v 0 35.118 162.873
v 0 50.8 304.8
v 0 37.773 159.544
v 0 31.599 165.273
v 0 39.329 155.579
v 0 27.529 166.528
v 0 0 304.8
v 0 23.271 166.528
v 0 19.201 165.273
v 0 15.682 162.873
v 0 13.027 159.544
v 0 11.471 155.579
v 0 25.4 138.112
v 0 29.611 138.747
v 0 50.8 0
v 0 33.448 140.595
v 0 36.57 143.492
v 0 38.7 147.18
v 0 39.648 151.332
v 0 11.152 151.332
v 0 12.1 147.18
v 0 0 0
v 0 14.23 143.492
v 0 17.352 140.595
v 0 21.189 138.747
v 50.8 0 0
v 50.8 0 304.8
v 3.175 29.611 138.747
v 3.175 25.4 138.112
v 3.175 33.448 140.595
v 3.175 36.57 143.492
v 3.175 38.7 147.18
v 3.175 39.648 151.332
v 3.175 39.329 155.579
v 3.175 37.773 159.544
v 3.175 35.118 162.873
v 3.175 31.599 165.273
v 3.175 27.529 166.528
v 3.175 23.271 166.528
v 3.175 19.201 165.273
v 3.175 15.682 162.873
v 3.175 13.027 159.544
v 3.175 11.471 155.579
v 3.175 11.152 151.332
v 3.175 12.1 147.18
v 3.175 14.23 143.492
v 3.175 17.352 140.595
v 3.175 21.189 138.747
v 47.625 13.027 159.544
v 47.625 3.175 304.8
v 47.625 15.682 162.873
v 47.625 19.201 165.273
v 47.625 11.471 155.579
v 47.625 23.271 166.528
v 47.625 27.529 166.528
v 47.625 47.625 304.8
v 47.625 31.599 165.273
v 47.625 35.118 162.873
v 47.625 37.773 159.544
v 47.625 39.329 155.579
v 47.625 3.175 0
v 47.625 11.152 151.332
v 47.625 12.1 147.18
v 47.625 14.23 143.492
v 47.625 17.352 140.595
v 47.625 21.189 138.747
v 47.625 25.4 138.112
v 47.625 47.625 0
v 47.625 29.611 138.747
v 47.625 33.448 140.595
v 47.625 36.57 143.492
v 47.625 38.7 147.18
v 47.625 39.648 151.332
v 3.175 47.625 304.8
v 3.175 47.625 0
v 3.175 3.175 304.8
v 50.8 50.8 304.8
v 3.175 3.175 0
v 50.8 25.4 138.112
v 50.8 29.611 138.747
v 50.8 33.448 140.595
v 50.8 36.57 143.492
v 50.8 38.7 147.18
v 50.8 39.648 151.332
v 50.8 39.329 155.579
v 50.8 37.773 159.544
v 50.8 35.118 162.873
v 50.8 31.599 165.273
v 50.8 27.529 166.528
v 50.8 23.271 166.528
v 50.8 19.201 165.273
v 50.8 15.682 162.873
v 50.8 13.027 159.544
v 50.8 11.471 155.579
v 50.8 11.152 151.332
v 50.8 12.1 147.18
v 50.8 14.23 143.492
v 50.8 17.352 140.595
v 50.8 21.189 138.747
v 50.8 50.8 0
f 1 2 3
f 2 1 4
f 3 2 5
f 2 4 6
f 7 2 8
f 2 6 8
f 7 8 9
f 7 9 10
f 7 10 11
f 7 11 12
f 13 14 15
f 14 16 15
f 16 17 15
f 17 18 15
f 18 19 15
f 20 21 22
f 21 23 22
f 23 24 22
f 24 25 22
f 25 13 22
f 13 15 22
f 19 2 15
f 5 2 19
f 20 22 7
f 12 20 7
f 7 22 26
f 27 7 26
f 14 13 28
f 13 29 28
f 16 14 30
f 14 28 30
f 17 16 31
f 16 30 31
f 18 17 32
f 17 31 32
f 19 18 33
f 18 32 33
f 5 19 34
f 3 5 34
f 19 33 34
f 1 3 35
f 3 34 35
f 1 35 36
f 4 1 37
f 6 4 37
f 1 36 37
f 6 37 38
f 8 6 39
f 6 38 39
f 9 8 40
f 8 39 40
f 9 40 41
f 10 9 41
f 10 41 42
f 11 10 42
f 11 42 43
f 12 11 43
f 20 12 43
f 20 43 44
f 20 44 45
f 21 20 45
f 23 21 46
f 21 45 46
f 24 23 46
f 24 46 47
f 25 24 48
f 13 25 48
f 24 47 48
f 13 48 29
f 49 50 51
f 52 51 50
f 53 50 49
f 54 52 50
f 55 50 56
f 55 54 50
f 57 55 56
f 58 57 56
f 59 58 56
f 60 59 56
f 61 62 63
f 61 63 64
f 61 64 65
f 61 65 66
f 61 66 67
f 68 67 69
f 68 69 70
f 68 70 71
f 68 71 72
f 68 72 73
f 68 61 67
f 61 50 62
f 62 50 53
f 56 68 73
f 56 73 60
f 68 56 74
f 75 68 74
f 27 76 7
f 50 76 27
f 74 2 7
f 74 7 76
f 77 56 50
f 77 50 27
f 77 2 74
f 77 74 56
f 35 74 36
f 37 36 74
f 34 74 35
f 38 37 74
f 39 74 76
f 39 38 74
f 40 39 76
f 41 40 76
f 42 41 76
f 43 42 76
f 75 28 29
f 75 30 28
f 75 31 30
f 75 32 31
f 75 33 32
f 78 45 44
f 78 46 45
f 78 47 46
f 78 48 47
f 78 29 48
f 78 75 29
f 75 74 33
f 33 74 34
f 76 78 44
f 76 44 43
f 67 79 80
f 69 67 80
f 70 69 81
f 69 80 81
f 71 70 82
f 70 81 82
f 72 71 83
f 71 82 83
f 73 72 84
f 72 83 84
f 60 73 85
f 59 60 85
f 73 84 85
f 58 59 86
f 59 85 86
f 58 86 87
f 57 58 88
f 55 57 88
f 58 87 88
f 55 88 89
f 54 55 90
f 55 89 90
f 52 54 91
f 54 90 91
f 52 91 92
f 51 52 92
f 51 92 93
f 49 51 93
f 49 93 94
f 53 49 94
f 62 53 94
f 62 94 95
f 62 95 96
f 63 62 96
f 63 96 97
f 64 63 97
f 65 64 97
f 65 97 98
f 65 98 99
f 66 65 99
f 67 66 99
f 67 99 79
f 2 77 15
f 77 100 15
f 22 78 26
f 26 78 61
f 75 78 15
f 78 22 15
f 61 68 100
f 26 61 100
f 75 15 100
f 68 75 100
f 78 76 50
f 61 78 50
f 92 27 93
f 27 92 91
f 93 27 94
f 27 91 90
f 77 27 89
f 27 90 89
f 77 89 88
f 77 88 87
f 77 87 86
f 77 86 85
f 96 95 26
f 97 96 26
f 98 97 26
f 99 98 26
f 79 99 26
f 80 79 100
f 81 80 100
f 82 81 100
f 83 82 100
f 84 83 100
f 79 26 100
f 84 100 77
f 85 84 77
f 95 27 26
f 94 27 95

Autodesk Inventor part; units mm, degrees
ref_plane "YZ Plane" through (0, 0, 0) normal (1, 0, 0) x (0, 1, 0)
ref_plane "XZ Plane" through (0, 0, 0) normal (0, 1, 0) x (-1, 0, 0)
ref_plane "XY Plane" through (0, 0, 0) normal (0, 0, 1) x (1, 0, 0)
sketch "Sketch1" plane through (0, 0, 0) normal (0, 0, 1) x (1, 0, 0)
  line L0 (0, 0) -> (50.8, 0)
  line L1 (50.8, 0) -> (50.8, 50.8)
  line L2 (50.8, 50.8) -> (0, 50.8)
  line L3 (0, 50.8) -> (0, 0)
  line L4 (3.175, 3.175) -> (47.625, 3.175)
  line L5 (47.625, 3.175) -> (47.625, 47.625)
  line L6 (47.625, 47.625) -> (3.175, 47.625)
  line L7 (3.175, 47.625) -> (3.175, 3.175)
  dimension "d0" = 50.8
  dimension "d1" = 50.8
  dimension "d2" = 44.45
  dimension "d3" = 44.45
  dimension "d4" = 3.175
  dimension "d5" = 3.175
extrude "Extrusion1" add sketch "Sketch1" along normal blind 304.8
sketch "Sketch2" plane through (50.8, 0, 0) normal (1, 0, 0) x (0, 0, -1)
  line L0 (0, 0) -> (0, 50.8) projected
  line L1 (0, 50.8) -> (-304.8, 50.8) projected
  circle A0 centre (-152.4, 25.4) radius 14.2875
  dimension "d8" = 28.575
  dimension "d9" = 25.4
  dimension "d10" = 152.4
extrude "Extrusion2" cut sketch "Sketch2" against normal through all
properties part number "Frame Segment"
